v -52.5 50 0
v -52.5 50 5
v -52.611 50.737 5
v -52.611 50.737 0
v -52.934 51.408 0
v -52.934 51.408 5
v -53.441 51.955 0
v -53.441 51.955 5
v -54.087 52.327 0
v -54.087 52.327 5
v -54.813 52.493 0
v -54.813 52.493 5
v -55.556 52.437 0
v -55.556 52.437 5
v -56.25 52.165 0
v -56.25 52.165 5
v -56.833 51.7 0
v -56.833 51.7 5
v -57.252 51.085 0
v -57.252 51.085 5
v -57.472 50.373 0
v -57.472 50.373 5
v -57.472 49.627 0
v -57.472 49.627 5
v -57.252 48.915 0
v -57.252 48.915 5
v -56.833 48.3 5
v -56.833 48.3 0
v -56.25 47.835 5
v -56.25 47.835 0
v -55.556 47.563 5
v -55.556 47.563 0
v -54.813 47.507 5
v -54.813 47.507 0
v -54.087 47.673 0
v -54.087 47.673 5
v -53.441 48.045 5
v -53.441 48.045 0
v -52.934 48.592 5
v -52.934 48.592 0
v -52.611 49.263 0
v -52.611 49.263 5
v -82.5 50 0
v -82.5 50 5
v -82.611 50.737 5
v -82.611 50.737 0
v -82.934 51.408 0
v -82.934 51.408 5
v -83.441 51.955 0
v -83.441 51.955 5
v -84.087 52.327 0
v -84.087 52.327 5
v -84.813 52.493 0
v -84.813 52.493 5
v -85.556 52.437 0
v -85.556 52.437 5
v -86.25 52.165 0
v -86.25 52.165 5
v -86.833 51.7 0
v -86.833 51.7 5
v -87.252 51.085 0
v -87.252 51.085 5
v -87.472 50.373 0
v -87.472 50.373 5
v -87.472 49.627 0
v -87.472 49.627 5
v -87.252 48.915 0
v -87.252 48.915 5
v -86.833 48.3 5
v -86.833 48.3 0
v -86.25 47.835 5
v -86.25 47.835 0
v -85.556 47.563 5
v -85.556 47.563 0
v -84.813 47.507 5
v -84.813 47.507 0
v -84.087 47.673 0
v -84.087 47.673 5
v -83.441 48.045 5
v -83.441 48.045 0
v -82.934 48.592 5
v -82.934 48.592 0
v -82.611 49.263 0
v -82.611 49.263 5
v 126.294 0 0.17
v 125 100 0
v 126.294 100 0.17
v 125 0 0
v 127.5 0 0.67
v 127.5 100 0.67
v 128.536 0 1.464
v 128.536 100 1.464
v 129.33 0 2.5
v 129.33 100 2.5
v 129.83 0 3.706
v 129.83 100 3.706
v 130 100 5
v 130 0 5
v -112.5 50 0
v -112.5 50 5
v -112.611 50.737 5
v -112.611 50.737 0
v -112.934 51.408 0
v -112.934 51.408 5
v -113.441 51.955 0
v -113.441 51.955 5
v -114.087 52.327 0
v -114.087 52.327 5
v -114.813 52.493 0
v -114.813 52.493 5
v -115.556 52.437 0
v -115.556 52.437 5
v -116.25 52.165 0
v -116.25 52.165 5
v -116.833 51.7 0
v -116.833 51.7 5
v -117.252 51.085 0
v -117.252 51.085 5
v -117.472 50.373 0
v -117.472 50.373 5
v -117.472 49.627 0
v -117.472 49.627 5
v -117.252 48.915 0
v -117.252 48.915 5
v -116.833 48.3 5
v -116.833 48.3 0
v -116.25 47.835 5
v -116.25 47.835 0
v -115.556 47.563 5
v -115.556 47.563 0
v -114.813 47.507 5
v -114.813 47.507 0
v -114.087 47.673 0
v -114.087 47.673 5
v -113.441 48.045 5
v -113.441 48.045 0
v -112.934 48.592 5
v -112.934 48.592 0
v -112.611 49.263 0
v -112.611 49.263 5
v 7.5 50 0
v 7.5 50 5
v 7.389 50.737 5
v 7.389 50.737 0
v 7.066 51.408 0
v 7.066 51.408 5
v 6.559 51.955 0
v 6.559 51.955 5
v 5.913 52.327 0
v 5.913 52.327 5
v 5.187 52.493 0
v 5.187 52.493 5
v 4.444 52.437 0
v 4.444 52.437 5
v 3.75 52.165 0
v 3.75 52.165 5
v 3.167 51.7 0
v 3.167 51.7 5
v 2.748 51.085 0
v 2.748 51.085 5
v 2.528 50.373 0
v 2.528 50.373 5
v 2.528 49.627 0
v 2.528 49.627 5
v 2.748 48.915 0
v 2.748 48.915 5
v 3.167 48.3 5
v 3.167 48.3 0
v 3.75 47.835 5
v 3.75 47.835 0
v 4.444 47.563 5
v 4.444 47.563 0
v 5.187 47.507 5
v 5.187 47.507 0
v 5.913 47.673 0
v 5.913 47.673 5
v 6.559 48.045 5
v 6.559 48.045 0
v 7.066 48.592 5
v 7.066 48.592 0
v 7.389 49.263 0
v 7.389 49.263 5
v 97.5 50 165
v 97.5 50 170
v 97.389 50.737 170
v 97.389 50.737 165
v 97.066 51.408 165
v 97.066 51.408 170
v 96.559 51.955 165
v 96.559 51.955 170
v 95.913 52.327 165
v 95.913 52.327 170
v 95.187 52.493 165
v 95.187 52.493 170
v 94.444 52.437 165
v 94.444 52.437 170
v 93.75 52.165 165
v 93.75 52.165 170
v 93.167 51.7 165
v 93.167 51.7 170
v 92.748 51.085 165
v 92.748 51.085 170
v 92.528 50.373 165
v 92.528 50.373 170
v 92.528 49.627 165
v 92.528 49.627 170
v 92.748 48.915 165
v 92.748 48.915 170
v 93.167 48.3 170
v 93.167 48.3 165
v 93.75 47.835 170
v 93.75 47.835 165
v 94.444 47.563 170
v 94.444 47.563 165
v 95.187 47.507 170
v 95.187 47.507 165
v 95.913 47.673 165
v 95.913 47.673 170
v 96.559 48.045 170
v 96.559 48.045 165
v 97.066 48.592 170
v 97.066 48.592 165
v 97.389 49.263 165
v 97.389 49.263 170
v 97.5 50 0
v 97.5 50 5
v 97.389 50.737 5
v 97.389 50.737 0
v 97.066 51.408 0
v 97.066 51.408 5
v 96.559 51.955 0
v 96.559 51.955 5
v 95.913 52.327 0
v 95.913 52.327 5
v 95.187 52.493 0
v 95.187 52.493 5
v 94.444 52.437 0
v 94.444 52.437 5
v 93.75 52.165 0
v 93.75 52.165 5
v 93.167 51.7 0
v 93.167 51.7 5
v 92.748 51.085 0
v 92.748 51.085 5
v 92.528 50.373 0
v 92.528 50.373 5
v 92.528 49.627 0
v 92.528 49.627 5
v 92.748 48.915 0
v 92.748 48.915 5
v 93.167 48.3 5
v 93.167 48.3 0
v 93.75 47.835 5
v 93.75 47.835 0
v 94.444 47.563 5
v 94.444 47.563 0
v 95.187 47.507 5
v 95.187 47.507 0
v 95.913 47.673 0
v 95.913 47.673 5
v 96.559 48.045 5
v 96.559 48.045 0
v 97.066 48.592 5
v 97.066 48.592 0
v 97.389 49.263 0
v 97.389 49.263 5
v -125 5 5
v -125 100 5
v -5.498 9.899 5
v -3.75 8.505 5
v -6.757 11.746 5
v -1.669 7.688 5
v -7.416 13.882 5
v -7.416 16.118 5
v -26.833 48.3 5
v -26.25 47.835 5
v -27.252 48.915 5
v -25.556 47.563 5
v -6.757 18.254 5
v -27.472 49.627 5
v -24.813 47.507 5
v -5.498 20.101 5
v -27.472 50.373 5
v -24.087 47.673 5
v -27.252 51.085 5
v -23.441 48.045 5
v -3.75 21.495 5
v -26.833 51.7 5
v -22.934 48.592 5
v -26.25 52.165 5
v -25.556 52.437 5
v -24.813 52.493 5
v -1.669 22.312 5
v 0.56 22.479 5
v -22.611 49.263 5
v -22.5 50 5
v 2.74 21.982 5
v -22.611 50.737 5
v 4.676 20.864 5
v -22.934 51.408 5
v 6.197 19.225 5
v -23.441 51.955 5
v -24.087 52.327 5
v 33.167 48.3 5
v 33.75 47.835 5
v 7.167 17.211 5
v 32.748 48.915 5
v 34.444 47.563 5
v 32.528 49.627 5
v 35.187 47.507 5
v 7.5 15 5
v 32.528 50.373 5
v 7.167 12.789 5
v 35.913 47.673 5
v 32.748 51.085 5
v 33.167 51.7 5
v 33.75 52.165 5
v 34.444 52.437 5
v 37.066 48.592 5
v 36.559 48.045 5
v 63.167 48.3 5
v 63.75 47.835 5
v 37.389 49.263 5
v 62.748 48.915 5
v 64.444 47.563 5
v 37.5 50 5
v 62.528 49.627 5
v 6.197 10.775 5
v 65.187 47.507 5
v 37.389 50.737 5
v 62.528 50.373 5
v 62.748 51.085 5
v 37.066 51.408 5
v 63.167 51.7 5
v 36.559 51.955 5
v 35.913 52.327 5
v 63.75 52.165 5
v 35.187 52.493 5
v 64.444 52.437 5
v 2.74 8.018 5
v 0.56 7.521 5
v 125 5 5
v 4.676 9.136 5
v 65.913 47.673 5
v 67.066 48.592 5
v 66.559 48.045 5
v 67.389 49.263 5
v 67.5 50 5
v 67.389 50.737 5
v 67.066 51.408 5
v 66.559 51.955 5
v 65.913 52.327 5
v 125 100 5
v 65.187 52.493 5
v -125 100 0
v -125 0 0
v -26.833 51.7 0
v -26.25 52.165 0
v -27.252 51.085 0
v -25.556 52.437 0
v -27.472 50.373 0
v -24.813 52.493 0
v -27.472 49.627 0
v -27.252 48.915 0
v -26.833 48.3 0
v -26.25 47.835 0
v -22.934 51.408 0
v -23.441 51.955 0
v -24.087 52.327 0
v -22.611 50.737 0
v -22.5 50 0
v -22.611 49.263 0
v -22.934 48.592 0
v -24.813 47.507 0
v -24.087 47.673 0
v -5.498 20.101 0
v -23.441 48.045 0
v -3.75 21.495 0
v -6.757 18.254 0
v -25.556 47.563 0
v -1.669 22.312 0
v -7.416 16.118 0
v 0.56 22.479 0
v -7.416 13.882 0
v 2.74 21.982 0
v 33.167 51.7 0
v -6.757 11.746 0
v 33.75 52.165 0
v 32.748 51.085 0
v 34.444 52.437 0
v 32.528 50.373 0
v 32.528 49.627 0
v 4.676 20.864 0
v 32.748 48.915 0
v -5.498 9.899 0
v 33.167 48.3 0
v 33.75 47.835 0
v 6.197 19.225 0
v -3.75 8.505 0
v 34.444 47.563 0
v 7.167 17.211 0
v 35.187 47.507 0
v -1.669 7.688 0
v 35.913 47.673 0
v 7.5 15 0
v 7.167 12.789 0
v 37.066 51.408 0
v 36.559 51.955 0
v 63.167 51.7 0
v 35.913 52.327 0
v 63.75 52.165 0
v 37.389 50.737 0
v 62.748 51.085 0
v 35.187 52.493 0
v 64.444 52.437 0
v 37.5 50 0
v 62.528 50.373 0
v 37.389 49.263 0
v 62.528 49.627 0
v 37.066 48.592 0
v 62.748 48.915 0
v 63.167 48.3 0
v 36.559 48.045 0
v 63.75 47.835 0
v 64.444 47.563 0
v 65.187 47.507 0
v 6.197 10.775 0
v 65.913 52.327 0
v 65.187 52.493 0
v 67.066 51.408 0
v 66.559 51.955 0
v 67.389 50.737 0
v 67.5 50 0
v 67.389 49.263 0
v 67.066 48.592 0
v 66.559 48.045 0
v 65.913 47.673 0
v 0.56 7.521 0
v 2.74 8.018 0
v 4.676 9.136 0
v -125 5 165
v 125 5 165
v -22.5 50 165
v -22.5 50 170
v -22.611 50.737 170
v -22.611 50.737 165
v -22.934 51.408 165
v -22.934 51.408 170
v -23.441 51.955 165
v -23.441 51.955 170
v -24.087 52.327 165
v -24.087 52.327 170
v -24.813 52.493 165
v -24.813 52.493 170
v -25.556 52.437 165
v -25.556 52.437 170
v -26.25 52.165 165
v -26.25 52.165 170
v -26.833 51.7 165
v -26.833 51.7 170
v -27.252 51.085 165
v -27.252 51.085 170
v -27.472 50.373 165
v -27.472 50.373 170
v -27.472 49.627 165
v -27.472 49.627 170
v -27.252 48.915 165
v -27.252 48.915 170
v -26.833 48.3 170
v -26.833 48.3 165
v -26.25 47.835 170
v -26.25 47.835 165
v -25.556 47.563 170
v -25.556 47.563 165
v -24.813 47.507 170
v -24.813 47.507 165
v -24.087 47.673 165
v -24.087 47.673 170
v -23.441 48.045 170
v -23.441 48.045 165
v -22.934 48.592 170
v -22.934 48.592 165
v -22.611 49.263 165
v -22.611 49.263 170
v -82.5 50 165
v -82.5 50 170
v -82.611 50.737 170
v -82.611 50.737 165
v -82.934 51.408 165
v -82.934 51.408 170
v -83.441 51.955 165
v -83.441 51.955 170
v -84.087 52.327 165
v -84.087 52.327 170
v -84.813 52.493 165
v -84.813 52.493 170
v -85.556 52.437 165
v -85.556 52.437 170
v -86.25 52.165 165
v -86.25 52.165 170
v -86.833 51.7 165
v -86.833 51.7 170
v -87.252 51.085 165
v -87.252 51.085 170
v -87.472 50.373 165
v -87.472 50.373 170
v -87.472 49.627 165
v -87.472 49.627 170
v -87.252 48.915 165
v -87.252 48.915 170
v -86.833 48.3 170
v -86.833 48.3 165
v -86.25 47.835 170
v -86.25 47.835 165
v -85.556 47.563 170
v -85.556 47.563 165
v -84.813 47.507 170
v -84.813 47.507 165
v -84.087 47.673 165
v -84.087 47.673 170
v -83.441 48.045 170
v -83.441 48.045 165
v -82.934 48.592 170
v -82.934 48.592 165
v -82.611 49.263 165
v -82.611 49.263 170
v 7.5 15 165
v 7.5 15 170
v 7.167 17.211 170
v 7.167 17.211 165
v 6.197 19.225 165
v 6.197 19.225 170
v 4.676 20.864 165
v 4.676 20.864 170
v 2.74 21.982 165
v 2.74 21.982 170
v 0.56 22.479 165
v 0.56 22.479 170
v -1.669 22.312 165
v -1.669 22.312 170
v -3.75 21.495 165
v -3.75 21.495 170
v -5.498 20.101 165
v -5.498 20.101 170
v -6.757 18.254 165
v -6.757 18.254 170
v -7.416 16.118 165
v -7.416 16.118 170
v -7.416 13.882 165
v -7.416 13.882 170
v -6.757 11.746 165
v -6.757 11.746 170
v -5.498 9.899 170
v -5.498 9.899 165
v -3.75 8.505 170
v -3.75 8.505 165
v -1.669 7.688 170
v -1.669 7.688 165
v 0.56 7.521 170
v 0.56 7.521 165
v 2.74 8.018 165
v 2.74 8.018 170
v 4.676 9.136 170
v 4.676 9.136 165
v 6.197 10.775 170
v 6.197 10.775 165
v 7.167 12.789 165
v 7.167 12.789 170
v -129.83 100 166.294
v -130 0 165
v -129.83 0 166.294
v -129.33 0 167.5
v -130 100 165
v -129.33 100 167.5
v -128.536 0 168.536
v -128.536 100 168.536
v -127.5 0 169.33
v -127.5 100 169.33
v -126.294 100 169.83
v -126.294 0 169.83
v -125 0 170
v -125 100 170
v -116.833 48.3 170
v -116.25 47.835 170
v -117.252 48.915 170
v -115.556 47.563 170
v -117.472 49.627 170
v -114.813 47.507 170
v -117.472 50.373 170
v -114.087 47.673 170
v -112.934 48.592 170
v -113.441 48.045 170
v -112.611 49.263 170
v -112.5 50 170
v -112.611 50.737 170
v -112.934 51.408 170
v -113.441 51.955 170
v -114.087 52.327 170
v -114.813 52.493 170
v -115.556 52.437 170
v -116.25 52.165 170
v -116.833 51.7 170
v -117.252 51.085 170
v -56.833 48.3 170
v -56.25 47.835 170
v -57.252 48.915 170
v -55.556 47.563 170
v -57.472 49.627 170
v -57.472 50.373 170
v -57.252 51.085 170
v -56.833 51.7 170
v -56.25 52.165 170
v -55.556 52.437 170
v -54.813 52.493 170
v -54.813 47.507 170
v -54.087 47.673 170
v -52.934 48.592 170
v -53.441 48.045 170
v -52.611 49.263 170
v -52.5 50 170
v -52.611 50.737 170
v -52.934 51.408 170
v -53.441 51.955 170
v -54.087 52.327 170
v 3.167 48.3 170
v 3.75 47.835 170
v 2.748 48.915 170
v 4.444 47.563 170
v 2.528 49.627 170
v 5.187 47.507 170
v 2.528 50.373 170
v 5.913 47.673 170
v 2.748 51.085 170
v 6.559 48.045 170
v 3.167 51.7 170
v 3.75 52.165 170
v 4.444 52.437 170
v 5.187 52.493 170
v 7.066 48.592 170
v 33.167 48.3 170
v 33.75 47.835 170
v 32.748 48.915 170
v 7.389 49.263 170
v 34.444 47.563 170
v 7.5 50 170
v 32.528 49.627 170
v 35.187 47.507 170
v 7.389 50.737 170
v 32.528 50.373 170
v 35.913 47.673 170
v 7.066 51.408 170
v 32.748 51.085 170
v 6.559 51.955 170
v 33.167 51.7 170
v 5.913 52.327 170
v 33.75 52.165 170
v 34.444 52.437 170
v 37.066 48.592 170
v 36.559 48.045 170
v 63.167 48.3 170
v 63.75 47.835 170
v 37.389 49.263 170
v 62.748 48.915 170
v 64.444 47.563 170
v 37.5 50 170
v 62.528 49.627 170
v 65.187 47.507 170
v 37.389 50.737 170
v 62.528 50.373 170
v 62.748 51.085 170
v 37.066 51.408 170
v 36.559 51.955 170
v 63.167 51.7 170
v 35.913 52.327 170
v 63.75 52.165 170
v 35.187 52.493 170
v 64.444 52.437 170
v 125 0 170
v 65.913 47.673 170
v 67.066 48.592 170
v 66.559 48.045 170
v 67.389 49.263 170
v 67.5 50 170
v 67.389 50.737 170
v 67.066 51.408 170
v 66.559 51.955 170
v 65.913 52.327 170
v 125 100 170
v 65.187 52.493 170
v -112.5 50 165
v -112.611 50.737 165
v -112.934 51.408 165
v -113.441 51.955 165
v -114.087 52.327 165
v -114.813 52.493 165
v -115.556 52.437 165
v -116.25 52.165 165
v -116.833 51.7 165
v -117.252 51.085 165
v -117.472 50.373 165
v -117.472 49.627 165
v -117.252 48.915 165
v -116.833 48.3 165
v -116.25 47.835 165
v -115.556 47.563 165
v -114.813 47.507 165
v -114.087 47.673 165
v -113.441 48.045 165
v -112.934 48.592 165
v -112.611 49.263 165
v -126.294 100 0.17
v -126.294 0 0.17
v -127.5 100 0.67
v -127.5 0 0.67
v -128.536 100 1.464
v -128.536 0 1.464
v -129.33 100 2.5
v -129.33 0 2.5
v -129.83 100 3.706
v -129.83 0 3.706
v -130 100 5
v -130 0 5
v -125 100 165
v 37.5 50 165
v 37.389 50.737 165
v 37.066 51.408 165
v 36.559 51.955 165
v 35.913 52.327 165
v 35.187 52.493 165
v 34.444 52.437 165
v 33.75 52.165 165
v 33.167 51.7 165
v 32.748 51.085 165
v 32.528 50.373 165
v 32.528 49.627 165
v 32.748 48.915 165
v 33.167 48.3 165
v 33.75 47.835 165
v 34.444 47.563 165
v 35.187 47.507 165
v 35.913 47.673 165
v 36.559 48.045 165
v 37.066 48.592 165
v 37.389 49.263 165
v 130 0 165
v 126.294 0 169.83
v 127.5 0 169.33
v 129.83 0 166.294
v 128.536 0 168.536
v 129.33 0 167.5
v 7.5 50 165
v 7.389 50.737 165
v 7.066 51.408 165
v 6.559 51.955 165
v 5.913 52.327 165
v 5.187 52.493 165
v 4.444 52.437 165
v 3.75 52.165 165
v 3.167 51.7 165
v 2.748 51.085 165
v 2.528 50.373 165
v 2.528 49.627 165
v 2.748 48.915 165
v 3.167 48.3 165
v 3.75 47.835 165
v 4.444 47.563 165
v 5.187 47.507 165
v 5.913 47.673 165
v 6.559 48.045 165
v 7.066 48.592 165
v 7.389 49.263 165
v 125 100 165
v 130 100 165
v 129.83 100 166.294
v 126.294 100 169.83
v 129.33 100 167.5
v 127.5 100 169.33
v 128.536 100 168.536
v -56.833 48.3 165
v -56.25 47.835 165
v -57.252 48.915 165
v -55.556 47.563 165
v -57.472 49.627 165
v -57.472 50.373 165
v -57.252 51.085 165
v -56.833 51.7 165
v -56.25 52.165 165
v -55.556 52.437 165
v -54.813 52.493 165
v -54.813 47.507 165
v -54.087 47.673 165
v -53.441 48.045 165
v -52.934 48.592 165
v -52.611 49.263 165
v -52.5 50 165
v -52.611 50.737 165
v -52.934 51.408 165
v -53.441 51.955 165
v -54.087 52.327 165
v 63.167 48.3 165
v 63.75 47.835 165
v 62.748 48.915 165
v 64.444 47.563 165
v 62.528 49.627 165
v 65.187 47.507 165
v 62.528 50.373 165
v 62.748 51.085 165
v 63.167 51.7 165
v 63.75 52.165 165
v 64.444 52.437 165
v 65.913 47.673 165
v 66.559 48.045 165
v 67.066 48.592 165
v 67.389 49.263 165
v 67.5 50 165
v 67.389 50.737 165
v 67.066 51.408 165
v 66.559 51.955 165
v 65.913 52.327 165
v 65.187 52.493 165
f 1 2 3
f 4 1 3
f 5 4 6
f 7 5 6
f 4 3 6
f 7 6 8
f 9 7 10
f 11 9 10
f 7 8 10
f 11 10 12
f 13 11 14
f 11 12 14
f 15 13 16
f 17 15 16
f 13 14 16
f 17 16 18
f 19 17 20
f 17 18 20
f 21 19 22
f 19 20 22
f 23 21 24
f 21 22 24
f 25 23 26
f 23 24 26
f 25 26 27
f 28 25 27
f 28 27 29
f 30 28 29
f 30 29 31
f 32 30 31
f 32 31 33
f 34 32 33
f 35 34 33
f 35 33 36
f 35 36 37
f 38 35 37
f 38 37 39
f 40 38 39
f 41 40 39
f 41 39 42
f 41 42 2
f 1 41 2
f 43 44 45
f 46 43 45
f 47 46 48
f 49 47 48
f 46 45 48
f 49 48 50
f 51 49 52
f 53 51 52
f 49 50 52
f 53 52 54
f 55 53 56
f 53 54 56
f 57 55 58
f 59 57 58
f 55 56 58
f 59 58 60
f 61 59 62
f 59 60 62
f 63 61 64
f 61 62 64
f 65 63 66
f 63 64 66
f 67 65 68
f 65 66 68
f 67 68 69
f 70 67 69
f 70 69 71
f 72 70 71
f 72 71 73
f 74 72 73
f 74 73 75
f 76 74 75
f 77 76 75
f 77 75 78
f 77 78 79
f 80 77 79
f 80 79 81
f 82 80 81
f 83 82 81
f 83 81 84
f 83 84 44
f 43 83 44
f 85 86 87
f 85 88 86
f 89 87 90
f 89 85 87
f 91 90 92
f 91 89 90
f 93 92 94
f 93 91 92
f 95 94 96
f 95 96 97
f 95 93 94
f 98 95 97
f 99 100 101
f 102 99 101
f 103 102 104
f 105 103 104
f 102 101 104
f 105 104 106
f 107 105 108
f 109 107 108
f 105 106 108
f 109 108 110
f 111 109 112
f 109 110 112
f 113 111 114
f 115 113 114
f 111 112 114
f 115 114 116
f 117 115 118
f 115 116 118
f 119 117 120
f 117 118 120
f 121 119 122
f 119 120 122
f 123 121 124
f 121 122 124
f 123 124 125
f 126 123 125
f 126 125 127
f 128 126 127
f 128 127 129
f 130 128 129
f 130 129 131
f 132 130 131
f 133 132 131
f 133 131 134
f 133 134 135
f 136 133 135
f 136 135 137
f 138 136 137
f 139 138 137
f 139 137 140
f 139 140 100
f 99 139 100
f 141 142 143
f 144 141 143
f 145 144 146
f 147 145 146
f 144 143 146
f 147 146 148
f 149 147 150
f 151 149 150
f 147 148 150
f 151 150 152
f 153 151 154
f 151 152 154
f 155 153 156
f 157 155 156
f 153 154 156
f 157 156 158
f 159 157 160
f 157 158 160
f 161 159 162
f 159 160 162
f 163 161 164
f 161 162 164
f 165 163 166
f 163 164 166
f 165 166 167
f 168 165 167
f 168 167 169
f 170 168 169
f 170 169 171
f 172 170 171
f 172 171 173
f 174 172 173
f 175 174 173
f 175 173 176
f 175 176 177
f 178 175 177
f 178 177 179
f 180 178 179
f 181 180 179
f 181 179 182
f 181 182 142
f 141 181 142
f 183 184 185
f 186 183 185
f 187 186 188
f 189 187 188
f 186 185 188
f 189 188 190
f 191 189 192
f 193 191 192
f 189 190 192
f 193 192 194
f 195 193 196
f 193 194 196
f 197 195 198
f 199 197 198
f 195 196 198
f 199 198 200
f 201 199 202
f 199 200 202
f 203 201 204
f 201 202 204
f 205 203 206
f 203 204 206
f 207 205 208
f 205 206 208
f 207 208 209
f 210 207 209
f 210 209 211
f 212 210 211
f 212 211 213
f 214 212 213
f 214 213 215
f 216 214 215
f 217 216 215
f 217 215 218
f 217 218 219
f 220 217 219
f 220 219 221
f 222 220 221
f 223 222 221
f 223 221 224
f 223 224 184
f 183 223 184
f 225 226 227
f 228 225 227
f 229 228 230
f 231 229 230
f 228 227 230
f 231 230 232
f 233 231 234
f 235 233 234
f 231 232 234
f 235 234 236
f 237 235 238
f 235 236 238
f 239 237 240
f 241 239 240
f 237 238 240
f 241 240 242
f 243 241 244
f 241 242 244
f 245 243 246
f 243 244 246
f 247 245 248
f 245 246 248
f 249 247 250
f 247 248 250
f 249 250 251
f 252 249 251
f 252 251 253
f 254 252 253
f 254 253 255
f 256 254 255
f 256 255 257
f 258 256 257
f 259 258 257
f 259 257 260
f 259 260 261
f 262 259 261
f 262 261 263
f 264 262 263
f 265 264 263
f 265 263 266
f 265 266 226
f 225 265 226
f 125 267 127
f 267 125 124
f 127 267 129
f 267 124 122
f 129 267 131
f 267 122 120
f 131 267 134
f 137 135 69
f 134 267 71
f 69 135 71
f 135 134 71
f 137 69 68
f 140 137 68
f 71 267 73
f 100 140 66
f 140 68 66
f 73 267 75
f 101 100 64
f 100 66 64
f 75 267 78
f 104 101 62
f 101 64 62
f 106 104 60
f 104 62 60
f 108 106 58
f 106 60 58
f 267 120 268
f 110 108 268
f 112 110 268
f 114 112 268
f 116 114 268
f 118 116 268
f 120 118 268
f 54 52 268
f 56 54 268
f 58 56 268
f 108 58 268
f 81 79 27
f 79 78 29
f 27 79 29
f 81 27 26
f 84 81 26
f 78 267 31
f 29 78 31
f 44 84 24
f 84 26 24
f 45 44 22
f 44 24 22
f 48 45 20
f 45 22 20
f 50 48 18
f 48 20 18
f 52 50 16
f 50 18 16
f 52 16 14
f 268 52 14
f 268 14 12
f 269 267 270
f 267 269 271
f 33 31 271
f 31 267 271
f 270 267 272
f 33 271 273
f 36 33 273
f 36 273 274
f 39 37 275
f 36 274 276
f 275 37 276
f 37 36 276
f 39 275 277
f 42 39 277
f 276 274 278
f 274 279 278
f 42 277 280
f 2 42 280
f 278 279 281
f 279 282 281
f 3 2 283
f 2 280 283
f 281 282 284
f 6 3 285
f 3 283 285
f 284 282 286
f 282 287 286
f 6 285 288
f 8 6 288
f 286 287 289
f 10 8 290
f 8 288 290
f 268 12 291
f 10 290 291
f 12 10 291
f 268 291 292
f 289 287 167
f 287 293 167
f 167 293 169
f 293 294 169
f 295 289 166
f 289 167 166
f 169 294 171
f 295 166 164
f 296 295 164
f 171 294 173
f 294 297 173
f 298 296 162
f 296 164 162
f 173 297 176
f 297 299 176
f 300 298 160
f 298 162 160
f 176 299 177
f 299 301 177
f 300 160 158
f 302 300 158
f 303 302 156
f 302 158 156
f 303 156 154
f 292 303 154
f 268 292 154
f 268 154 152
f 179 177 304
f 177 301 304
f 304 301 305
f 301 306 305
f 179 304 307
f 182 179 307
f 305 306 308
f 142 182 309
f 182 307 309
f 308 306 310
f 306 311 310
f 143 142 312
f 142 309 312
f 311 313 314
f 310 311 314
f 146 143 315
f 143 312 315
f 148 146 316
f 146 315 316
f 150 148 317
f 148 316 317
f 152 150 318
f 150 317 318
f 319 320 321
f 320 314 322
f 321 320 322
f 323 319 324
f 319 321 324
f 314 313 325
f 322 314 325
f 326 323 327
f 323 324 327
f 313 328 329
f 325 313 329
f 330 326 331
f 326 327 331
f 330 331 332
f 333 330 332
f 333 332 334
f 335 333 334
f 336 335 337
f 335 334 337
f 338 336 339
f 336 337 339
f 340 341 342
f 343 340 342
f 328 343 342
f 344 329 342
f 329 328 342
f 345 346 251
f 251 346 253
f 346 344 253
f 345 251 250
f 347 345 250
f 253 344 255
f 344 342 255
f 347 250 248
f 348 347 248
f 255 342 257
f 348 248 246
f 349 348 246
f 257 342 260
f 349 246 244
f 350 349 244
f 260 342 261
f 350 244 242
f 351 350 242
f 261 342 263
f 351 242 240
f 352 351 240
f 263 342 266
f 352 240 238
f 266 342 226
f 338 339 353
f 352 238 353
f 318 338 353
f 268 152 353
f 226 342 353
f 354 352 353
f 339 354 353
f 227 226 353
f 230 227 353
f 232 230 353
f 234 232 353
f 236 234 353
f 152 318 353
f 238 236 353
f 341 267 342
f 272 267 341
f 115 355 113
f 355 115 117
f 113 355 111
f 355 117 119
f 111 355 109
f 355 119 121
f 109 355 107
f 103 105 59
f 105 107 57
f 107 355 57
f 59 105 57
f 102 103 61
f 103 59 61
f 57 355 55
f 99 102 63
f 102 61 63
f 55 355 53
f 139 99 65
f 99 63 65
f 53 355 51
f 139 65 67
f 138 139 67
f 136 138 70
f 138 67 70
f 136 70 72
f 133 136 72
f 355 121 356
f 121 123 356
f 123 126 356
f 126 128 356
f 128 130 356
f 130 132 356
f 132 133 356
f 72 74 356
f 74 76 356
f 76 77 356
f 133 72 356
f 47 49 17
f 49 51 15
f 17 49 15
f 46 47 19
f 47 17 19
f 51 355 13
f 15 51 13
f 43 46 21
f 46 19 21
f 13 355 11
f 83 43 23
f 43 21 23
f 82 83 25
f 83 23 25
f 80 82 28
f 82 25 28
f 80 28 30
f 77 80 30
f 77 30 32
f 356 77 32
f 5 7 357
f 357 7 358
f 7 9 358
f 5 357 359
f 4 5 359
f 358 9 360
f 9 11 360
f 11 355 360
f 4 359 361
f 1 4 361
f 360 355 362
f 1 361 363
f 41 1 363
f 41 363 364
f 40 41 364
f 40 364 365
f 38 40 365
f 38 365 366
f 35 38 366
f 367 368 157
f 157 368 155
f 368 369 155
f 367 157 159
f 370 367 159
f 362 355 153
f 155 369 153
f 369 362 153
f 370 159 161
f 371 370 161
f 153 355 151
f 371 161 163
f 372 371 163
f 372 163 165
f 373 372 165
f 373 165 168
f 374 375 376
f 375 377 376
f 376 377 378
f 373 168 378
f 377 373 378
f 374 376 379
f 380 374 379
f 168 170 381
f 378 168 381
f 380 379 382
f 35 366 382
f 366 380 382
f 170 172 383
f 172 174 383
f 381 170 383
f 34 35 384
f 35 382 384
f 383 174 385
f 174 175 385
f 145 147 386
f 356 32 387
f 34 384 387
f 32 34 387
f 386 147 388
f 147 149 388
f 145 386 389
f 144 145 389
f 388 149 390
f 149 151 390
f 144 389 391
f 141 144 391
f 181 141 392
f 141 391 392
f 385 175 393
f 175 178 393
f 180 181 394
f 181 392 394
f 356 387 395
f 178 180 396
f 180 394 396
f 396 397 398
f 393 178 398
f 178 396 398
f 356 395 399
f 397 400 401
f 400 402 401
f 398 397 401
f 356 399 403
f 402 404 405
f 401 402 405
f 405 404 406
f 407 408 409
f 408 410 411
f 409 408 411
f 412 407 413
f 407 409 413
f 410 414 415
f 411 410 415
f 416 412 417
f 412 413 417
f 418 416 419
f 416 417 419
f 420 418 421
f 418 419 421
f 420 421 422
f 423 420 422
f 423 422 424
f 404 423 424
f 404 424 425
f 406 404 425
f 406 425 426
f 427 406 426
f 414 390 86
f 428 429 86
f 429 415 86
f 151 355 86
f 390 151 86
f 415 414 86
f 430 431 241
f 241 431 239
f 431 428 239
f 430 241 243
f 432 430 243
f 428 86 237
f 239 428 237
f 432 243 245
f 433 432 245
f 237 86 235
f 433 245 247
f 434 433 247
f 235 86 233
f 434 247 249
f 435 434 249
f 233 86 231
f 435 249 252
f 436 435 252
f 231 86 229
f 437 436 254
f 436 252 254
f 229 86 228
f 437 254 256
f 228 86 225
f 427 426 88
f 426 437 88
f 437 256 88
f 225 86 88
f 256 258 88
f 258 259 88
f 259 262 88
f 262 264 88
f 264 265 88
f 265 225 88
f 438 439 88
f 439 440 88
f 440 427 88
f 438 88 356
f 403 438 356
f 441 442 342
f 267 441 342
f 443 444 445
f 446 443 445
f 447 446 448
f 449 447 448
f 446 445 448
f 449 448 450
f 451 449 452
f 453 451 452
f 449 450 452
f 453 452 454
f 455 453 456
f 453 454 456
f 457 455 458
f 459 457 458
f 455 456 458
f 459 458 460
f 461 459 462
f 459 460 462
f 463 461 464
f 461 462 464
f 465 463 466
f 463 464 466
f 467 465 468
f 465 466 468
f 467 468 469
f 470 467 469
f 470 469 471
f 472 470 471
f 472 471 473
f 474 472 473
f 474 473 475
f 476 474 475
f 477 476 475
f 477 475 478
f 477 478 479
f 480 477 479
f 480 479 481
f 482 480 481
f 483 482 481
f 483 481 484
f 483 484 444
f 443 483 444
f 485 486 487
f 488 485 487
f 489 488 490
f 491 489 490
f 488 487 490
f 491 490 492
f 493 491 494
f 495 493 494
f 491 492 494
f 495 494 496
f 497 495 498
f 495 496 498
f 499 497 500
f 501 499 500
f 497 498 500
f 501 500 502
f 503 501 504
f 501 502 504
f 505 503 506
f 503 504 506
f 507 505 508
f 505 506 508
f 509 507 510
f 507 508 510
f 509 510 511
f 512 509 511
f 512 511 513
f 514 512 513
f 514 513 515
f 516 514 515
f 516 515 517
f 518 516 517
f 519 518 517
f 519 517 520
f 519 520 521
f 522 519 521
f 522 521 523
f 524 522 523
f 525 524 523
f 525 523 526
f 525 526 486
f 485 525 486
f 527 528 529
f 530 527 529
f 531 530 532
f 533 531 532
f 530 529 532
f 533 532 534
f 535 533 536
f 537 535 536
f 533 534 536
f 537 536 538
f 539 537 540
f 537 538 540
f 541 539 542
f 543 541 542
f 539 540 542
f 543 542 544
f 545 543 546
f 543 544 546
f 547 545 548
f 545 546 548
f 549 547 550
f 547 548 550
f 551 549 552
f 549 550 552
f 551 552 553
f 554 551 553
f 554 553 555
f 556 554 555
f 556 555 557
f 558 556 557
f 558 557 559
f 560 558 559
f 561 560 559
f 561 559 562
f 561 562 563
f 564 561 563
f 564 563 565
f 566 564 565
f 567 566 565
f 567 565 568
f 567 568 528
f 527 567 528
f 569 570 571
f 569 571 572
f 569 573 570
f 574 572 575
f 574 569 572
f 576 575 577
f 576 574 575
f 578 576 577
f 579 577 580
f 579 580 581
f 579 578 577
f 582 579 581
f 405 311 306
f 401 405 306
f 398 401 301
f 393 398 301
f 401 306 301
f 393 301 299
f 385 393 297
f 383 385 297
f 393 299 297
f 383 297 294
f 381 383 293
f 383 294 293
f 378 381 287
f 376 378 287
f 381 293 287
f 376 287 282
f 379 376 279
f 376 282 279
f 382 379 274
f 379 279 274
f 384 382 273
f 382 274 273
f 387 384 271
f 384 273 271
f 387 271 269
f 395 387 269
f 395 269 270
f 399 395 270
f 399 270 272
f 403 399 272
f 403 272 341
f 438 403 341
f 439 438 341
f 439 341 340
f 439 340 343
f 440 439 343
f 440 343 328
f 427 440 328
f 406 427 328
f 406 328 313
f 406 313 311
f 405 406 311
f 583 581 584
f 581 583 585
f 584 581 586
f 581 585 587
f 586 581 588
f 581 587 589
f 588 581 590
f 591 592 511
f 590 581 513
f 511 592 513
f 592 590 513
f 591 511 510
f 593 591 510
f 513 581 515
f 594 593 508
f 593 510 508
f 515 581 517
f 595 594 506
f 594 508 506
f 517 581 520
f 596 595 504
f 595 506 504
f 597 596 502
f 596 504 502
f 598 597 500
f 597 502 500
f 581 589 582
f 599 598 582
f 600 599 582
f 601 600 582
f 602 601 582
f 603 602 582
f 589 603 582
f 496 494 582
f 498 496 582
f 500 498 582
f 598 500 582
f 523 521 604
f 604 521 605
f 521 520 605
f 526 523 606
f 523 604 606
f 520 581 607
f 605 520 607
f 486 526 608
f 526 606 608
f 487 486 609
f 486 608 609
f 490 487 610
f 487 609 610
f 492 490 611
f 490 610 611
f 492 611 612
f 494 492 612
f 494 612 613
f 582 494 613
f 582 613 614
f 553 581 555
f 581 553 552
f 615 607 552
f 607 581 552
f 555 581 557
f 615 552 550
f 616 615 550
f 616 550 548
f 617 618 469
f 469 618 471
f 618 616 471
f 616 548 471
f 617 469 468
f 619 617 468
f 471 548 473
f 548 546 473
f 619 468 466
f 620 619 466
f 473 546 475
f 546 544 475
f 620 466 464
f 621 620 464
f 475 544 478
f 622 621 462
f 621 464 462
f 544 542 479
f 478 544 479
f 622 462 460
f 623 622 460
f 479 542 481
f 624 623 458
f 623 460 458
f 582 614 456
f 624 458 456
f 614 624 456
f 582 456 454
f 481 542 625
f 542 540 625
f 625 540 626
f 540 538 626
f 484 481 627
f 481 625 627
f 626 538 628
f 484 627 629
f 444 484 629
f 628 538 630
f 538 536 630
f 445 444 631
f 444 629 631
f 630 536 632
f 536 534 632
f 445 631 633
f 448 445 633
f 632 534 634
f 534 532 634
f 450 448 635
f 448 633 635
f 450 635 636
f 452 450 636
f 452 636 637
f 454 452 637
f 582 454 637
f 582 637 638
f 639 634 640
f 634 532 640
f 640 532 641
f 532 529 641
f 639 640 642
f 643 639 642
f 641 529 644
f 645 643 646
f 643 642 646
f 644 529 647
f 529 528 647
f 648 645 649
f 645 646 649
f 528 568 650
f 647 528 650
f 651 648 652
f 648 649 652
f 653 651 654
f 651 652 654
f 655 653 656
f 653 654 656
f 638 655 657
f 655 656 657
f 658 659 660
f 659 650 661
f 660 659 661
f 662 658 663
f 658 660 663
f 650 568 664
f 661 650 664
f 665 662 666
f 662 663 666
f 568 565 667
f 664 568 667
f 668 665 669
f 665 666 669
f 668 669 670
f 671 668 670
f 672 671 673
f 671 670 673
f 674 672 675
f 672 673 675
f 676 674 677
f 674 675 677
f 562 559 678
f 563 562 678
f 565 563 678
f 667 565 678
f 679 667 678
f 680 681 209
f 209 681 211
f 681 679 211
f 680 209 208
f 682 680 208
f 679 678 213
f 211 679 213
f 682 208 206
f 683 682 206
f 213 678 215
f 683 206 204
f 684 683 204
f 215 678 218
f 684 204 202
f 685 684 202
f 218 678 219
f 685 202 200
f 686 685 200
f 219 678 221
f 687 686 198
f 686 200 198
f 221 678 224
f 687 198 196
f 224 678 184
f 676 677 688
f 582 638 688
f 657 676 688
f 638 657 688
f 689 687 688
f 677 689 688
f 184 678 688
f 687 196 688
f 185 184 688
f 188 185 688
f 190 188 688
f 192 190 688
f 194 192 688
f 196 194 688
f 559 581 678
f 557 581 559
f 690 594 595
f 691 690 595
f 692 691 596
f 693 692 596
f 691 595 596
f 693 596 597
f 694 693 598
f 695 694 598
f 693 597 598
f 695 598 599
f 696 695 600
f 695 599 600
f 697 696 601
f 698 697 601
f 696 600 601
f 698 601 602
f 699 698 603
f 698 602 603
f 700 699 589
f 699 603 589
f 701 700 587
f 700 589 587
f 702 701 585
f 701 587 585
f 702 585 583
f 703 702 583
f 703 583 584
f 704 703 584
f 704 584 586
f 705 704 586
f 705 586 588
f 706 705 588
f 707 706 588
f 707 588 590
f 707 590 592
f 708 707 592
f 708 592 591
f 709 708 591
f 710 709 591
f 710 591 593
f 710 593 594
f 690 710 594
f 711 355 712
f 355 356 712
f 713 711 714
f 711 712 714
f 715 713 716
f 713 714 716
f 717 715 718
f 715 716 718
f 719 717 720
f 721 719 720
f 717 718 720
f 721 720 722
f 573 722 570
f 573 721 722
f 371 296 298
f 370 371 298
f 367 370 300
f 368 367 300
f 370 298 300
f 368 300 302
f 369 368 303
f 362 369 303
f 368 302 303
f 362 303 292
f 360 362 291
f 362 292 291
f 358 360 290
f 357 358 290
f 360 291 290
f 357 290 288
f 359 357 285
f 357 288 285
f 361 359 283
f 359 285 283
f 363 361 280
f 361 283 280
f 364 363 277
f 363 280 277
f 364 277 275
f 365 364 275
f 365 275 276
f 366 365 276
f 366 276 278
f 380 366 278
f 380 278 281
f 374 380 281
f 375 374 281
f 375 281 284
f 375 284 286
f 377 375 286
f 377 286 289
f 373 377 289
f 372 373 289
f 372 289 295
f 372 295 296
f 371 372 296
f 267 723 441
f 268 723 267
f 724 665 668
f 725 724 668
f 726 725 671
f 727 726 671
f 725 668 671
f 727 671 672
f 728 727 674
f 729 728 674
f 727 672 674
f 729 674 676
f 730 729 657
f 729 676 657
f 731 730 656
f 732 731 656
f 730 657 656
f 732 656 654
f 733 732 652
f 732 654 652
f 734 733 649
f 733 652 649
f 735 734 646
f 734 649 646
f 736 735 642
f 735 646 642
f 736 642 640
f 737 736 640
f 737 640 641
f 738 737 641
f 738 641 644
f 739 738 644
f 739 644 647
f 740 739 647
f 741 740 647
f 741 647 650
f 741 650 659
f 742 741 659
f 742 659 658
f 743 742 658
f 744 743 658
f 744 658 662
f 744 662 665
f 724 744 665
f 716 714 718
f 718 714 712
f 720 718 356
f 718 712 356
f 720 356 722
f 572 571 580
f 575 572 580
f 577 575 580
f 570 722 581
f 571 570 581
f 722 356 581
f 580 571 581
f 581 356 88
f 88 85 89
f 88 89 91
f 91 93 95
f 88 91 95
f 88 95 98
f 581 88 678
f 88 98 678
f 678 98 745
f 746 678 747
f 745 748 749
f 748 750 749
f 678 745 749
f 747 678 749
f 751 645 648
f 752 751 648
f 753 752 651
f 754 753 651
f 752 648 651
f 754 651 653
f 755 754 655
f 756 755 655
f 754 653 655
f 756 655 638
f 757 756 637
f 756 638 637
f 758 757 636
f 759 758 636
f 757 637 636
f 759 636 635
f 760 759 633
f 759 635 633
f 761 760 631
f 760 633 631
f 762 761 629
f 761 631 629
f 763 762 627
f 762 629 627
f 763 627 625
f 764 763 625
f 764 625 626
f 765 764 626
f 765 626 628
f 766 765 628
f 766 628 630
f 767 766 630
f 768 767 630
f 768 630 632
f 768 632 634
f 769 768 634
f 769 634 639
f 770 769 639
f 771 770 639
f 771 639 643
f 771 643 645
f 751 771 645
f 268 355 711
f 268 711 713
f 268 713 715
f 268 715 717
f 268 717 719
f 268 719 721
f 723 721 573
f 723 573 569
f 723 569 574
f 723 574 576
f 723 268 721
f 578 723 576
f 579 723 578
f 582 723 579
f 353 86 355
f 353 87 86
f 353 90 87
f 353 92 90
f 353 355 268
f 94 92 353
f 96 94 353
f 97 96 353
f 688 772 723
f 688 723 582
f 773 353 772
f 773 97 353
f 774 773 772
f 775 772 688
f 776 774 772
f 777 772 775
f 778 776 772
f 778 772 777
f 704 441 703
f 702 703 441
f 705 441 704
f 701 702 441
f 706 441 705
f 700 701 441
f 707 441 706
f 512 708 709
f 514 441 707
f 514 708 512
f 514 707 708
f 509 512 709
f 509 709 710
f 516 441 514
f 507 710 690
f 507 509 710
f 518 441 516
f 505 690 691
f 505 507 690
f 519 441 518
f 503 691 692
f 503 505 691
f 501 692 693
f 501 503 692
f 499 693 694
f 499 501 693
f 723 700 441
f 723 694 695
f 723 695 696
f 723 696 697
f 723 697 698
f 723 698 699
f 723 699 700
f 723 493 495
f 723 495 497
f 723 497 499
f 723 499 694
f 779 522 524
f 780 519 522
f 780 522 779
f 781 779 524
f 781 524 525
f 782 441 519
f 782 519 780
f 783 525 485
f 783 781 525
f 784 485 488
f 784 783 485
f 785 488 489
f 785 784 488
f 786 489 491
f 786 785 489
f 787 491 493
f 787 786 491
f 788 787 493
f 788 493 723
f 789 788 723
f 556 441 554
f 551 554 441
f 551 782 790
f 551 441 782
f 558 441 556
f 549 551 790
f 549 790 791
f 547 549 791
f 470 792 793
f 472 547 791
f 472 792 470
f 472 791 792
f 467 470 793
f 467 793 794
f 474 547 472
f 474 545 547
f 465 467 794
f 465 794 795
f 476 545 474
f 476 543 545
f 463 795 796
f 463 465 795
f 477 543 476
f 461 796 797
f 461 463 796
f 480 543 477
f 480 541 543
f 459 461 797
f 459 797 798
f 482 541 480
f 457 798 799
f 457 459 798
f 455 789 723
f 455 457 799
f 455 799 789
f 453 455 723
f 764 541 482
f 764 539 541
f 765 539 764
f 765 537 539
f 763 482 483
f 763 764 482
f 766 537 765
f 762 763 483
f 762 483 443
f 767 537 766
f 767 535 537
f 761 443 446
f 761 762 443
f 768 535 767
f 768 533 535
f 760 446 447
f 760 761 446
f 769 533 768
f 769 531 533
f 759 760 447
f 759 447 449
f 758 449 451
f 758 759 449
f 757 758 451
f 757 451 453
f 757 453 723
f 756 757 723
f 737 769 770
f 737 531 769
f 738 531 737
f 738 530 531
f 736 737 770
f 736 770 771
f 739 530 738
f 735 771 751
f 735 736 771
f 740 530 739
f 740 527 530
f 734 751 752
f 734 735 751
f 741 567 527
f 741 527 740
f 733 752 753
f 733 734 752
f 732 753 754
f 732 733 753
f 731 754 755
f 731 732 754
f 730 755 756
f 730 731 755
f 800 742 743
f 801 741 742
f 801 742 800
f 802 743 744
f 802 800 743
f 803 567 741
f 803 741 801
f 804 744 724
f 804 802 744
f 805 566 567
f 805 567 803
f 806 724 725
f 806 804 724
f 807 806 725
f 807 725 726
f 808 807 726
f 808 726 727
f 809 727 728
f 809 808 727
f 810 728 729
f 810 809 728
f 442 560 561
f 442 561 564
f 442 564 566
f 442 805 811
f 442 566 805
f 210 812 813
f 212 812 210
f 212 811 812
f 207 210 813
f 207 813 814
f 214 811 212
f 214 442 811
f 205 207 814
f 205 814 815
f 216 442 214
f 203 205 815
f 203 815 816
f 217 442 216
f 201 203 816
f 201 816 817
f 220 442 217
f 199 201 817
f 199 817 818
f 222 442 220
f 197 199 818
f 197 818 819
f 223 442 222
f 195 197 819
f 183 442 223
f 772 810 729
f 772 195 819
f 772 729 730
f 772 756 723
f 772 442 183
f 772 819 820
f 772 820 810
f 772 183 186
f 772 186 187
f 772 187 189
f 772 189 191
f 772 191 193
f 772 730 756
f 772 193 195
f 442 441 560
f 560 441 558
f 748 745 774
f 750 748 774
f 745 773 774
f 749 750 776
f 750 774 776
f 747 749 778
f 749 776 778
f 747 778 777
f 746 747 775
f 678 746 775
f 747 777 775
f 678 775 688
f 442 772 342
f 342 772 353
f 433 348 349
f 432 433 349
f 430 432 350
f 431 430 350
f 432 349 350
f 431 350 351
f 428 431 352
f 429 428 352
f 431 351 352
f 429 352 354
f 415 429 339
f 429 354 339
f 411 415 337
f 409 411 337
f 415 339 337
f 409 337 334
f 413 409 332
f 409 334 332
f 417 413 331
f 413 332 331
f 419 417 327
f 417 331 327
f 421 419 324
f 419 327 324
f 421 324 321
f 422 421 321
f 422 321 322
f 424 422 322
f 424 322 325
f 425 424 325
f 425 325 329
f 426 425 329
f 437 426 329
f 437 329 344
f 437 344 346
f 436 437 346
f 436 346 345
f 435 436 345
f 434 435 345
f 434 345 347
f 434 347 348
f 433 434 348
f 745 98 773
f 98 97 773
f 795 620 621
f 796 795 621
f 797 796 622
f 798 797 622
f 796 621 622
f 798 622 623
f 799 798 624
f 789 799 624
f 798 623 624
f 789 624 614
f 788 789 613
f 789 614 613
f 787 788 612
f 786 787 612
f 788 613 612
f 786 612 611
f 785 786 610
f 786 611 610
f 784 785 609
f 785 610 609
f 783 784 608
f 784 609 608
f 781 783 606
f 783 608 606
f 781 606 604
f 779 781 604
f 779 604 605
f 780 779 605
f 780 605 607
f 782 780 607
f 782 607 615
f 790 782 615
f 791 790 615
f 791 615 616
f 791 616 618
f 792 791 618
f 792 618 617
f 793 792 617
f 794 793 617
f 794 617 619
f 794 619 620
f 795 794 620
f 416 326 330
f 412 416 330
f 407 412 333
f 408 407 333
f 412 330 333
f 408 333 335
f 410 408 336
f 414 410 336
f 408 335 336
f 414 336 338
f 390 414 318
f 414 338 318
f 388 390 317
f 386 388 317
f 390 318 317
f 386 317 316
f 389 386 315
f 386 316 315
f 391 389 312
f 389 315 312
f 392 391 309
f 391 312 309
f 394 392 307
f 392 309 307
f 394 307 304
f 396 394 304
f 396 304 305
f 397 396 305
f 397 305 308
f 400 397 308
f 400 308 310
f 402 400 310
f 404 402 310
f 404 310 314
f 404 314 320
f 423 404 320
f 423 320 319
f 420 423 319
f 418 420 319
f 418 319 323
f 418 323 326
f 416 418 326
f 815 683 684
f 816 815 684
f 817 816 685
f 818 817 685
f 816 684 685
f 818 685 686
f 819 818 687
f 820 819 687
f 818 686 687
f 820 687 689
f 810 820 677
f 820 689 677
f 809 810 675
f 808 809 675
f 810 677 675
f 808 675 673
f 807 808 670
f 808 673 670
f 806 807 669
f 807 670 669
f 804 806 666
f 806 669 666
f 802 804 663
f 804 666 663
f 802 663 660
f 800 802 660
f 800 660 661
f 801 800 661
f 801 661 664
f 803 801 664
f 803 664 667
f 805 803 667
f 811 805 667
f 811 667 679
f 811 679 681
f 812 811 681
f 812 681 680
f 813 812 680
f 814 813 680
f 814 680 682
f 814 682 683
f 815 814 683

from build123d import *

# Parameters (mm, degrees)
SKETCH1_W           = 170
SKETCH1_H           = 100
BOSS_EXTRUDE1_DEPTH = 130
SKETCH1_3_W         = 160
SKETCH1_3_H         = 95
CUT_EXTRUDE1_DEPTH  = 125
FILLET1_R           = 5
SKETCH2_R           = 2.5
CUT_EXTRUDE2_DEPTH  = 237.22023622
SKETCH3_R           = 7.5
CUT_EXTRUDE3_DEPTH  = 237.22023622


with BuildPart() as part:
    # Sketch1 → Boss-Extrude1 (new, symmetric)
    with BuildSketch(Plane(origin=(0, 0, 0), x_dir=(0, 0, -1), z_dir=(1, 0, 0))):
        with Locations((-85, 50)):
            Rectangle(SKETCH1_W, SKETCH1_H)
    extrude(amount=BOSS_EXTRUDE1_DEPTH, both=True)

    # Sketch1<3> → Cut-Extrude1 (cut, symmetric)
    with BuildSketch(Plane(origin=(0, 0, 0), x_dir=(0, 0, -1), z_dir=(1, 0, 0))):
        with Locations((-85, 52.5)):
            Rectangle(SKETCH1_3_W, SKETCH1_3_H)
    extrude(amount=CUT_EXTRUDE1_DEPTH, both=True, mode=Mode.SUBTRACT)

    # Fillet1
    fillet1_edges = [part.edges().sort_by_distance(p)[0] for p in [
        (-130, 50, 0),
        (130, 50, 0),
        (-130, 50, 170),
        (130, 50, 170),
    ]]
    fillet(fillet1_edges, radius=FILLET1_R)

    # Sketch2 → Cut-Extrude2 (cut, through all)
    with BuildSketch(Plane.XY.offset(170)):
        with Locations((95, 50)):
            Circle(SKETCH2_R)
        with Locations((65, 50)):
            Circle(SKETCH2_R)
        with Locations((35, 50)):
            Circle(SKETCH2_R)
        with Locations((5, 50)):
            Circle(SKETCH2_R)
        with Locations((-25, 50)):
            Circle(SKETCH2_R)
        with Locations((-55, 50)):
            Circle(SKETCH2_R)
        with Locations((-85, 50)):
            Circle(SKETCH2_R)
        with Locations((-115, 50)):
            Circle(SKETCH2_R)
    extrude(amount=-CUT_EXTRUDE2_DEPTH, mode=Mode.SUBTRACT)

    # Sketch3 → Cut-Extrude3 (cut, through all)
    with BuildSketch(Plane.XY.offset(170)):
        with Locations((0, 15)):
            Circle(SKETCH3_R)
    extrude(amount=-CUT_EXTRUDE3_DEPTH, mode=Mode.SUBTRACT)


solid = part.part
